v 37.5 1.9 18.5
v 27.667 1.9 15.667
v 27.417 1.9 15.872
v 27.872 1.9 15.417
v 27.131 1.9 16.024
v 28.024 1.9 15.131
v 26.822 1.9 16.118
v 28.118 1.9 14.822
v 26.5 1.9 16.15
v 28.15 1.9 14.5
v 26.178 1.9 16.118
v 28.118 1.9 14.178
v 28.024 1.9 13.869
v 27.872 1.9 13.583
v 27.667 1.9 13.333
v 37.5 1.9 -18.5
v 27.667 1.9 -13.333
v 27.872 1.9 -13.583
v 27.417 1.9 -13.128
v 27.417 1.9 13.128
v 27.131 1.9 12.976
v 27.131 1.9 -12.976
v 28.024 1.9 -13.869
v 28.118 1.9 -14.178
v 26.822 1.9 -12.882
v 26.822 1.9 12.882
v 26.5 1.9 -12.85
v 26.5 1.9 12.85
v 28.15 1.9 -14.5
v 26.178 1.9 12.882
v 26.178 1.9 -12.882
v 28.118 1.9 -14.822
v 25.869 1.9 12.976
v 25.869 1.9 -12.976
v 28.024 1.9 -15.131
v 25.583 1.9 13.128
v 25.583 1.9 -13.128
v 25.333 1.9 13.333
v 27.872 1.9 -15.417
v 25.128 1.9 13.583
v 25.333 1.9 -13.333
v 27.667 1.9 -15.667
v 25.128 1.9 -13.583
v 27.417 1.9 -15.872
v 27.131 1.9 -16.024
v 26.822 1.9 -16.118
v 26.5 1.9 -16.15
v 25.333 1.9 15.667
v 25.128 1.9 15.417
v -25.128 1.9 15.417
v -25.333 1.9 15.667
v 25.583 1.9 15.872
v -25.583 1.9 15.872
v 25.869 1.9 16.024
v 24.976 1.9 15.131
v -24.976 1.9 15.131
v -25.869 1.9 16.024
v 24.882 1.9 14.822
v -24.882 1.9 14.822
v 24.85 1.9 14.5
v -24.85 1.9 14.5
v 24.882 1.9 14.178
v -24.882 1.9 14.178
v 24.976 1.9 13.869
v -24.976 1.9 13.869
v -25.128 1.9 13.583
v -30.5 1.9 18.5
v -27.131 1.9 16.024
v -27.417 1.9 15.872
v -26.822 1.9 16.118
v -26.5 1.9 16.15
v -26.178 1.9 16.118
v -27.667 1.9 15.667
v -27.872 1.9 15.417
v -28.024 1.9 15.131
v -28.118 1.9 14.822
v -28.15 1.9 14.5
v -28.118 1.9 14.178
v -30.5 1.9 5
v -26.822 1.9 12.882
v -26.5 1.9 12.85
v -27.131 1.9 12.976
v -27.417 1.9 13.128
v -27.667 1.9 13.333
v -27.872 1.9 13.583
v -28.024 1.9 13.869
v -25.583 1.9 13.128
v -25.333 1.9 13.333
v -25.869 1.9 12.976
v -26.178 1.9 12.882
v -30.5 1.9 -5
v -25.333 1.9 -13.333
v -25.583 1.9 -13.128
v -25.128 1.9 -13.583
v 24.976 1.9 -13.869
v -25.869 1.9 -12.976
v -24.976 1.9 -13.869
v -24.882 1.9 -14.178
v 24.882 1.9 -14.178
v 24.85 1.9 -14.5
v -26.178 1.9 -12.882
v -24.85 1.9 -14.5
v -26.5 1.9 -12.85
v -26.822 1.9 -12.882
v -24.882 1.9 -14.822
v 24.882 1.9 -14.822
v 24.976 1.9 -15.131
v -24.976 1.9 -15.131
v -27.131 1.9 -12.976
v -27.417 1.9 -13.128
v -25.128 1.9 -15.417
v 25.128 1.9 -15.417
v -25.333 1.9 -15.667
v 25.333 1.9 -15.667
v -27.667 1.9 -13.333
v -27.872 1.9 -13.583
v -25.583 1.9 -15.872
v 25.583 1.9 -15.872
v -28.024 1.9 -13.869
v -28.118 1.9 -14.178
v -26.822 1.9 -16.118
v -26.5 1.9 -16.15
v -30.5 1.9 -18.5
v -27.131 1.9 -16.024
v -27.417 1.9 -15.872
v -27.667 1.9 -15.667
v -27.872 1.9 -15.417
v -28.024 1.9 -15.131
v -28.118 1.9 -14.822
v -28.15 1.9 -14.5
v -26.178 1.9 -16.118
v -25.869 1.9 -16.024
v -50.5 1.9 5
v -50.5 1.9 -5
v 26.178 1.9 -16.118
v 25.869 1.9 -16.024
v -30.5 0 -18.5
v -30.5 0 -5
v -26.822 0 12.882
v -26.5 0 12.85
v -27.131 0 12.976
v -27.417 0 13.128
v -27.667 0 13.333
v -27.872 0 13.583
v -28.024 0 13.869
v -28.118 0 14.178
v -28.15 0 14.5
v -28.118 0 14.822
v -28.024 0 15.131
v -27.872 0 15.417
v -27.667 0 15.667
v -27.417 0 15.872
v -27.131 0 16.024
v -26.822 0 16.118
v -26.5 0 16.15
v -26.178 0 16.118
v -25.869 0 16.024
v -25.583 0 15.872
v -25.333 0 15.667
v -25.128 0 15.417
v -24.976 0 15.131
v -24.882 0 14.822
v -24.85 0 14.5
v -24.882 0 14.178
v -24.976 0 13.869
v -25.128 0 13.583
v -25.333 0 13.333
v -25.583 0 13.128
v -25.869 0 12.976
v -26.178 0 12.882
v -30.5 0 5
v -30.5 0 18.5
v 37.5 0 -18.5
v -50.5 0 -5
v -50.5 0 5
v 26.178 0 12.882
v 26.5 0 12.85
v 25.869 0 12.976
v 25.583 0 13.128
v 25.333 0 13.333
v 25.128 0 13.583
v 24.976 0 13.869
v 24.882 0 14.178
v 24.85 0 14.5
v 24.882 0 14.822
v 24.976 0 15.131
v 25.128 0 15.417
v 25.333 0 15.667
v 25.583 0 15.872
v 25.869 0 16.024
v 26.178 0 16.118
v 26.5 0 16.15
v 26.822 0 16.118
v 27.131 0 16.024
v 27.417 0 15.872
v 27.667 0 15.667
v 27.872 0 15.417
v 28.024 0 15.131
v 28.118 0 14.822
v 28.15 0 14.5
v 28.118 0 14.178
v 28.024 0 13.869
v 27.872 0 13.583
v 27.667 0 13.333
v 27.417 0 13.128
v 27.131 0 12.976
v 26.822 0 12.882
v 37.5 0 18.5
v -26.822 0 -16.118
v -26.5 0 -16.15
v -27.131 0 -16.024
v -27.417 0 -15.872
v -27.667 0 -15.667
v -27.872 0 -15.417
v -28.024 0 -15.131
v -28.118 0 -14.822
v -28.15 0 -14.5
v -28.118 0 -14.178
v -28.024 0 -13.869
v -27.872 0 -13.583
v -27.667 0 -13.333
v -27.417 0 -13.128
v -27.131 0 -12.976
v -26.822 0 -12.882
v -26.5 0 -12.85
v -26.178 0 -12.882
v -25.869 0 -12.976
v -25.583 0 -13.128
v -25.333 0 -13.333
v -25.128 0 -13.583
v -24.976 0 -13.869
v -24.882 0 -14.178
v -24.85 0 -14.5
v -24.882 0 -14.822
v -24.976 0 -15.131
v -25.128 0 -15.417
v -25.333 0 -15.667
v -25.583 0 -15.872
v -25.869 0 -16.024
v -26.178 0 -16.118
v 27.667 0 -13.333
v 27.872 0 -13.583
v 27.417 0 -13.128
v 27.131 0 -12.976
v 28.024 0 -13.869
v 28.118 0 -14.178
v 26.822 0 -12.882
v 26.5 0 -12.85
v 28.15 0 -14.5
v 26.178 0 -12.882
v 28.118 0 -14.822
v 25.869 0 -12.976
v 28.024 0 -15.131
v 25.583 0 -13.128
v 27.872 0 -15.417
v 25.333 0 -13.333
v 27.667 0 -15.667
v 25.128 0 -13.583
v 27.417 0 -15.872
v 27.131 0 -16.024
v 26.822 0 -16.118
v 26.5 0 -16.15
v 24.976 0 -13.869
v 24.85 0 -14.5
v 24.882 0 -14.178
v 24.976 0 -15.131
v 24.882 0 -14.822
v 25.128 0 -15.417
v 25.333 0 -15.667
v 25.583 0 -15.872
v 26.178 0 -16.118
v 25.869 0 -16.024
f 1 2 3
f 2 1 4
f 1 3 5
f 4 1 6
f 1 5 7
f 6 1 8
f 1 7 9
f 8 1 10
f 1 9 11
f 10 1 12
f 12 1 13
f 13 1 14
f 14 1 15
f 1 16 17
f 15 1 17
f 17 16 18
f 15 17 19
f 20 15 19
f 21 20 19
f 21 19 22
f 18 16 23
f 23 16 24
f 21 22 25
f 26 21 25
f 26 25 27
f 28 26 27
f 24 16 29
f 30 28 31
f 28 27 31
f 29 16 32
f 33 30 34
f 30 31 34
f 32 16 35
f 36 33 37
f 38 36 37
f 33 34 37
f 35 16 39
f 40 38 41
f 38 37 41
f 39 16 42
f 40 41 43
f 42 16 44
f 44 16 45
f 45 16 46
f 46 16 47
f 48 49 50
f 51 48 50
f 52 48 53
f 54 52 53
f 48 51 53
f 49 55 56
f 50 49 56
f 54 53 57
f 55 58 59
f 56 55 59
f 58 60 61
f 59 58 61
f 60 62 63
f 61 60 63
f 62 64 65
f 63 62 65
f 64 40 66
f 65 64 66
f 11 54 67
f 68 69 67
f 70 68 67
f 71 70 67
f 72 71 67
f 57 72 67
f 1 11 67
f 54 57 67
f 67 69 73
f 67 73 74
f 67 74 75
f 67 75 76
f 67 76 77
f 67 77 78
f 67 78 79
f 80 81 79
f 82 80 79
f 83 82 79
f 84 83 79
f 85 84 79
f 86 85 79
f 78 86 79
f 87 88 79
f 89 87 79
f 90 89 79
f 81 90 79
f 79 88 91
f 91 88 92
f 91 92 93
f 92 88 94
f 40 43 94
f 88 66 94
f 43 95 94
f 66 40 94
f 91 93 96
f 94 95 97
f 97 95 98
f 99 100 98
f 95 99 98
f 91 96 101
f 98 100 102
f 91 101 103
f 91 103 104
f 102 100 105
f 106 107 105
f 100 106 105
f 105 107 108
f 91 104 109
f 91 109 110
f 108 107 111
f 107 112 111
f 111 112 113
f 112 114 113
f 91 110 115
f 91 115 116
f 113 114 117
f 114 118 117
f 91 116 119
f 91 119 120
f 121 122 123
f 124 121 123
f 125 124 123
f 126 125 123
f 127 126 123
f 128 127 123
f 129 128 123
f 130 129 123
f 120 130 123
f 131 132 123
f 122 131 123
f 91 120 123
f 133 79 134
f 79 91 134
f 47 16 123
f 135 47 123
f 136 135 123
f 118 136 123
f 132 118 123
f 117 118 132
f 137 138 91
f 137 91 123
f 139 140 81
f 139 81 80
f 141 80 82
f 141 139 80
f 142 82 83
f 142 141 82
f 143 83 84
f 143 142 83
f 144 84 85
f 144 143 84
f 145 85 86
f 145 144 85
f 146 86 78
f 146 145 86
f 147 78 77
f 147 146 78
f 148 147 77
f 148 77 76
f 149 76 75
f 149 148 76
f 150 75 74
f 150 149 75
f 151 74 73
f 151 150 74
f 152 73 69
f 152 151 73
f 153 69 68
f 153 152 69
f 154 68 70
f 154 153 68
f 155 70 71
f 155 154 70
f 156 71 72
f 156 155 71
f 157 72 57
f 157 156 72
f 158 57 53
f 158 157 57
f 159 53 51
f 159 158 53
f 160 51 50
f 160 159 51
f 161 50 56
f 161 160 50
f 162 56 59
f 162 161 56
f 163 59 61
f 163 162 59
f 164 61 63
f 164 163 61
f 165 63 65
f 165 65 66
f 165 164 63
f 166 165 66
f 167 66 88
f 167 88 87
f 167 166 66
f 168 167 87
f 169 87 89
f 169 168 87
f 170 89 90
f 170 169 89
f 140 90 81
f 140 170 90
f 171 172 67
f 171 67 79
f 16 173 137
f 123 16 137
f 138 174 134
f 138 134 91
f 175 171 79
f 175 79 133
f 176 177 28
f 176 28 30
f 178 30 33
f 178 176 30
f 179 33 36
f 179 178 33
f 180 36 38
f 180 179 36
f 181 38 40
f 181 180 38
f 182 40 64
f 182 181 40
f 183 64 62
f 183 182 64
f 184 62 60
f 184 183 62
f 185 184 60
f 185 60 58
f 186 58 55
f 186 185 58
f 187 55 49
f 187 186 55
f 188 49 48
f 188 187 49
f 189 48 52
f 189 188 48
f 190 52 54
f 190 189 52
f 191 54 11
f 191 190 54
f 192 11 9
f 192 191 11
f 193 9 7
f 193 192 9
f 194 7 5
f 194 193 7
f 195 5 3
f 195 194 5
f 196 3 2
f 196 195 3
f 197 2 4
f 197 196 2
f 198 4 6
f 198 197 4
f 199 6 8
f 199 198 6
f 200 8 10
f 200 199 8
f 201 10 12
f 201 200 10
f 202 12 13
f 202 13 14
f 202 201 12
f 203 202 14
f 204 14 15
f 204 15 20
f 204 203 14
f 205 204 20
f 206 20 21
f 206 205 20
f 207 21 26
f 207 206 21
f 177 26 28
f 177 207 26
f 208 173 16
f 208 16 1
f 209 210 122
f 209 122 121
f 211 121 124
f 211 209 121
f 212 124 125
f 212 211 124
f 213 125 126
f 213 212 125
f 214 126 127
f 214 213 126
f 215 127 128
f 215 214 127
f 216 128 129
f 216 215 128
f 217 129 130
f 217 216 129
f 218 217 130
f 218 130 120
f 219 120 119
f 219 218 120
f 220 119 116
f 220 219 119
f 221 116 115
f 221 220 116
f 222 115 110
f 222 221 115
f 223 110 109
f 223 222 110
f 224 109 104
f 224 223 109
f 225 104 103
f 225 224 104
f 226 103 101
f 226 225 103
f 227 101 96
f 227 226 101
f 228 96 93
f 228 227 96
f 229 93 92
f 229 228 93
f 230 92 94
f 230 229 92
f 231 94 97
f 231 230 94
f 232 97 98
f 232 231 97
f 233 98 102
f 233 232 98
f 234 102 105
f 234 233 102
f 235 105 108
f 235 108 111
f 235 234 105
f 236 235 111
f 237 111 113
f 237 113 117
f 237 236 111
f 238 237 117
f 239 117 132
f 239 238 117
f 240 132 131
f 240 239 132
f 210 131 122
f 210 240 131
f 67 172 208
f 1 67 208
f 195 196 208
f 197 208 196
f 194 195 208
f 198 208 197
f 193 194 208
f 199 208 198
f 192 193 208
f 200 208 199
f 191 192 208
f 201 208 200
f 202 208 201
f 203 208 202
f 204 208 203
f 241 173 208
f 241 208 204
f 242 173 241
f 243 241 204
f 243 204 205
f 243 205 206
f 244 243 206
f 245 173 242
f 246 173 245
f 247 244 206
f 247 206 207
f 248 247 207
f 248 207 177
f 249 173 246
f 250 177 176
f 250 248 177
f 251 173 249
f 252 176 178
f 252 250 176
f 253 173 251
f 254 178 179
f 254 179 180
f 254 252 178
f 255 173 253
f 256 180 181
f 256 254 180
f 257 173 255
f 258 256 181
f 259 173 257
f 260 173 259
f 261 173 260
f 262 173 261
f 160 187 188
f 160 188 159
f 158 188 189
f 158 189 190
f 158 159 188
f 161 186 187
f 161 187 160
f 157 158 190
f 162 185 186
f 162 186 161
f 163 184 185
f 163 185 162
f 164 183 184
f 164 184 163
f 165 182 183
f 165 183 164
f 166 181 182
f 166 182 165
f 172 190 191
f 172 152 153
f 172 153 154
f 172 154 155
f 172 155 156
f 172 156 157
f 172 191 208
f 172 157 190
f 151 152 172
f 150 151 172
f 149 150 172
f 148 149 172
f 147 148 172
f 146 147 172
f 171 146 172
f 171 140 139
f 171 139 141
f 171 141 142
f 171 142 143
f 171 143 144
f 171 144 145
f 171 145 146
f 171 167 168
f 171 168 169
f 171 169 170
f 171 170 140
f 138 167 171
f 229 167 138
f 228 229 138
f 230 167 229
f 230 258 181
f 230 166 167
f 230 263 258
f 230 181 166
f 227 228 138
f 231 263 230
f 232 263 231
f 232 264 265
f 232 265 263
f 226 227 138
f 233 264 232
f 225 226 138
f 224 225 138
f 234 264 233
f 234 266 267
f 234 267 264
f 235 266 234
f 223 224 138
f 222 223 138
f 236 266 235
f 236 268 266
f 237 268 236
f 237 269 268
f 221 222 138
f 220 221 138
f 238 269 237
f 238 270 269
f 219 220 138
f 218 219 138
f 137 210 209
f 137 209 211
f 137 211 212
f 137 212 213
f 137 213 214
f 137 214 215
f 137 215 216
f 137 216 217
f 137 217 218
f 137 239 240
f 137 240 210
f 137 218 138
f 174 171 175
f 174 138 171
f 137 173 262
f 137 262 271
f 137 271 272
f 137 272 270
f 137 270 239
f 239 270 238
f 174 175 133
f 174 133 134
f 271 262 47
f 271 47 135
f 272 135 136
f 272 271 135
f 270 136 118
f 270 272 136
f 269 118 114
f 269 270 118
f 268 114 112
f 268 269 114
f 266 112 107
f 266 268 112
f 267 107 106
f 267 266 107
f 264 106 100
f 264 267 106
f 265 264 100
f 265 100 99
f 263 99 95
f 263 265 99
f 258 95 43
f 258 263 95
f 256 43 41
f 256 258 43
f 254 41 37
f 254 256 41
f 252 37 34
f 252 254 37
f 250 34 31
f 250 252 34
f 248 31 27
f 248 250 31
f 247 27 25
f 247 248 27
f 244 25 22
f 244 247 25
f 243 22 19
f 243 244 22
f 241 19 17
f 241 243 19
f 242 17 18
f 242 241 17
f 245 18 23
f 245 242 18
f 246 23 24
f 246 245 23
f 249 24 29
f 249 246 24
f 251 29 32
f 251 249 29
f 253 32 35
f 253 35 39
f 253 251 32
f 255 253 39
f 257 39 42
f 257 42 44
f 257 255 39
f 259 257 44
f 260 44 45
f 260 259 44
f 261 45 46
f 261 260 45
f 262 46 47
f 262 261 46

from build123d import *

# Parameters (mm, degrees)
SKETCH1_R           = 1.65
BOSS_EXTRUDE1_DEPTH = 1.9


with BuildPart() as part:
    # Sketch1 → Boss-Extrude1 (new body)
    with BuildSketch(Plane(origin=(0, 0, 0), x_dir=(1, 0, 0), z_dir=(0, 1, 0))):
        Polygon((-30.5, 18.5), (30.5, 18.5), (37.5, 18.5), (37.5, -18.5), (30.5, -18.5), (-30.5, -18.5), (-30.5, -5), (-50.5, -5), (-50.5, 5), (-30.5, 5), align=None)
        with Locations(Location((-26.5, 14.5, 0), (0, 0, 90))):
            Circle(SKETCH1_R, mode=Mode.SUBTRACT)
        with Locations(Location((26.5, 14.5, 0), (0, 0, 90))):
            Circle(SKETCH1_R, mode=Mode.SUBTRACT)
        with Locations(Location((26.5, -14.5, 0), (0, 0, 90))):
            Circle(SKETCH1_R, mode=Mode.SUBTRACT)
        with Locations(Location((-26.5, -14.5, 0), (0, 0, 90))):
            Circle(SKETCH1_R, mode=Mode.SUBTRACT)
    extrude(amount=BOSS_EXTRUDE1_DEPTH)


solid = part.part
